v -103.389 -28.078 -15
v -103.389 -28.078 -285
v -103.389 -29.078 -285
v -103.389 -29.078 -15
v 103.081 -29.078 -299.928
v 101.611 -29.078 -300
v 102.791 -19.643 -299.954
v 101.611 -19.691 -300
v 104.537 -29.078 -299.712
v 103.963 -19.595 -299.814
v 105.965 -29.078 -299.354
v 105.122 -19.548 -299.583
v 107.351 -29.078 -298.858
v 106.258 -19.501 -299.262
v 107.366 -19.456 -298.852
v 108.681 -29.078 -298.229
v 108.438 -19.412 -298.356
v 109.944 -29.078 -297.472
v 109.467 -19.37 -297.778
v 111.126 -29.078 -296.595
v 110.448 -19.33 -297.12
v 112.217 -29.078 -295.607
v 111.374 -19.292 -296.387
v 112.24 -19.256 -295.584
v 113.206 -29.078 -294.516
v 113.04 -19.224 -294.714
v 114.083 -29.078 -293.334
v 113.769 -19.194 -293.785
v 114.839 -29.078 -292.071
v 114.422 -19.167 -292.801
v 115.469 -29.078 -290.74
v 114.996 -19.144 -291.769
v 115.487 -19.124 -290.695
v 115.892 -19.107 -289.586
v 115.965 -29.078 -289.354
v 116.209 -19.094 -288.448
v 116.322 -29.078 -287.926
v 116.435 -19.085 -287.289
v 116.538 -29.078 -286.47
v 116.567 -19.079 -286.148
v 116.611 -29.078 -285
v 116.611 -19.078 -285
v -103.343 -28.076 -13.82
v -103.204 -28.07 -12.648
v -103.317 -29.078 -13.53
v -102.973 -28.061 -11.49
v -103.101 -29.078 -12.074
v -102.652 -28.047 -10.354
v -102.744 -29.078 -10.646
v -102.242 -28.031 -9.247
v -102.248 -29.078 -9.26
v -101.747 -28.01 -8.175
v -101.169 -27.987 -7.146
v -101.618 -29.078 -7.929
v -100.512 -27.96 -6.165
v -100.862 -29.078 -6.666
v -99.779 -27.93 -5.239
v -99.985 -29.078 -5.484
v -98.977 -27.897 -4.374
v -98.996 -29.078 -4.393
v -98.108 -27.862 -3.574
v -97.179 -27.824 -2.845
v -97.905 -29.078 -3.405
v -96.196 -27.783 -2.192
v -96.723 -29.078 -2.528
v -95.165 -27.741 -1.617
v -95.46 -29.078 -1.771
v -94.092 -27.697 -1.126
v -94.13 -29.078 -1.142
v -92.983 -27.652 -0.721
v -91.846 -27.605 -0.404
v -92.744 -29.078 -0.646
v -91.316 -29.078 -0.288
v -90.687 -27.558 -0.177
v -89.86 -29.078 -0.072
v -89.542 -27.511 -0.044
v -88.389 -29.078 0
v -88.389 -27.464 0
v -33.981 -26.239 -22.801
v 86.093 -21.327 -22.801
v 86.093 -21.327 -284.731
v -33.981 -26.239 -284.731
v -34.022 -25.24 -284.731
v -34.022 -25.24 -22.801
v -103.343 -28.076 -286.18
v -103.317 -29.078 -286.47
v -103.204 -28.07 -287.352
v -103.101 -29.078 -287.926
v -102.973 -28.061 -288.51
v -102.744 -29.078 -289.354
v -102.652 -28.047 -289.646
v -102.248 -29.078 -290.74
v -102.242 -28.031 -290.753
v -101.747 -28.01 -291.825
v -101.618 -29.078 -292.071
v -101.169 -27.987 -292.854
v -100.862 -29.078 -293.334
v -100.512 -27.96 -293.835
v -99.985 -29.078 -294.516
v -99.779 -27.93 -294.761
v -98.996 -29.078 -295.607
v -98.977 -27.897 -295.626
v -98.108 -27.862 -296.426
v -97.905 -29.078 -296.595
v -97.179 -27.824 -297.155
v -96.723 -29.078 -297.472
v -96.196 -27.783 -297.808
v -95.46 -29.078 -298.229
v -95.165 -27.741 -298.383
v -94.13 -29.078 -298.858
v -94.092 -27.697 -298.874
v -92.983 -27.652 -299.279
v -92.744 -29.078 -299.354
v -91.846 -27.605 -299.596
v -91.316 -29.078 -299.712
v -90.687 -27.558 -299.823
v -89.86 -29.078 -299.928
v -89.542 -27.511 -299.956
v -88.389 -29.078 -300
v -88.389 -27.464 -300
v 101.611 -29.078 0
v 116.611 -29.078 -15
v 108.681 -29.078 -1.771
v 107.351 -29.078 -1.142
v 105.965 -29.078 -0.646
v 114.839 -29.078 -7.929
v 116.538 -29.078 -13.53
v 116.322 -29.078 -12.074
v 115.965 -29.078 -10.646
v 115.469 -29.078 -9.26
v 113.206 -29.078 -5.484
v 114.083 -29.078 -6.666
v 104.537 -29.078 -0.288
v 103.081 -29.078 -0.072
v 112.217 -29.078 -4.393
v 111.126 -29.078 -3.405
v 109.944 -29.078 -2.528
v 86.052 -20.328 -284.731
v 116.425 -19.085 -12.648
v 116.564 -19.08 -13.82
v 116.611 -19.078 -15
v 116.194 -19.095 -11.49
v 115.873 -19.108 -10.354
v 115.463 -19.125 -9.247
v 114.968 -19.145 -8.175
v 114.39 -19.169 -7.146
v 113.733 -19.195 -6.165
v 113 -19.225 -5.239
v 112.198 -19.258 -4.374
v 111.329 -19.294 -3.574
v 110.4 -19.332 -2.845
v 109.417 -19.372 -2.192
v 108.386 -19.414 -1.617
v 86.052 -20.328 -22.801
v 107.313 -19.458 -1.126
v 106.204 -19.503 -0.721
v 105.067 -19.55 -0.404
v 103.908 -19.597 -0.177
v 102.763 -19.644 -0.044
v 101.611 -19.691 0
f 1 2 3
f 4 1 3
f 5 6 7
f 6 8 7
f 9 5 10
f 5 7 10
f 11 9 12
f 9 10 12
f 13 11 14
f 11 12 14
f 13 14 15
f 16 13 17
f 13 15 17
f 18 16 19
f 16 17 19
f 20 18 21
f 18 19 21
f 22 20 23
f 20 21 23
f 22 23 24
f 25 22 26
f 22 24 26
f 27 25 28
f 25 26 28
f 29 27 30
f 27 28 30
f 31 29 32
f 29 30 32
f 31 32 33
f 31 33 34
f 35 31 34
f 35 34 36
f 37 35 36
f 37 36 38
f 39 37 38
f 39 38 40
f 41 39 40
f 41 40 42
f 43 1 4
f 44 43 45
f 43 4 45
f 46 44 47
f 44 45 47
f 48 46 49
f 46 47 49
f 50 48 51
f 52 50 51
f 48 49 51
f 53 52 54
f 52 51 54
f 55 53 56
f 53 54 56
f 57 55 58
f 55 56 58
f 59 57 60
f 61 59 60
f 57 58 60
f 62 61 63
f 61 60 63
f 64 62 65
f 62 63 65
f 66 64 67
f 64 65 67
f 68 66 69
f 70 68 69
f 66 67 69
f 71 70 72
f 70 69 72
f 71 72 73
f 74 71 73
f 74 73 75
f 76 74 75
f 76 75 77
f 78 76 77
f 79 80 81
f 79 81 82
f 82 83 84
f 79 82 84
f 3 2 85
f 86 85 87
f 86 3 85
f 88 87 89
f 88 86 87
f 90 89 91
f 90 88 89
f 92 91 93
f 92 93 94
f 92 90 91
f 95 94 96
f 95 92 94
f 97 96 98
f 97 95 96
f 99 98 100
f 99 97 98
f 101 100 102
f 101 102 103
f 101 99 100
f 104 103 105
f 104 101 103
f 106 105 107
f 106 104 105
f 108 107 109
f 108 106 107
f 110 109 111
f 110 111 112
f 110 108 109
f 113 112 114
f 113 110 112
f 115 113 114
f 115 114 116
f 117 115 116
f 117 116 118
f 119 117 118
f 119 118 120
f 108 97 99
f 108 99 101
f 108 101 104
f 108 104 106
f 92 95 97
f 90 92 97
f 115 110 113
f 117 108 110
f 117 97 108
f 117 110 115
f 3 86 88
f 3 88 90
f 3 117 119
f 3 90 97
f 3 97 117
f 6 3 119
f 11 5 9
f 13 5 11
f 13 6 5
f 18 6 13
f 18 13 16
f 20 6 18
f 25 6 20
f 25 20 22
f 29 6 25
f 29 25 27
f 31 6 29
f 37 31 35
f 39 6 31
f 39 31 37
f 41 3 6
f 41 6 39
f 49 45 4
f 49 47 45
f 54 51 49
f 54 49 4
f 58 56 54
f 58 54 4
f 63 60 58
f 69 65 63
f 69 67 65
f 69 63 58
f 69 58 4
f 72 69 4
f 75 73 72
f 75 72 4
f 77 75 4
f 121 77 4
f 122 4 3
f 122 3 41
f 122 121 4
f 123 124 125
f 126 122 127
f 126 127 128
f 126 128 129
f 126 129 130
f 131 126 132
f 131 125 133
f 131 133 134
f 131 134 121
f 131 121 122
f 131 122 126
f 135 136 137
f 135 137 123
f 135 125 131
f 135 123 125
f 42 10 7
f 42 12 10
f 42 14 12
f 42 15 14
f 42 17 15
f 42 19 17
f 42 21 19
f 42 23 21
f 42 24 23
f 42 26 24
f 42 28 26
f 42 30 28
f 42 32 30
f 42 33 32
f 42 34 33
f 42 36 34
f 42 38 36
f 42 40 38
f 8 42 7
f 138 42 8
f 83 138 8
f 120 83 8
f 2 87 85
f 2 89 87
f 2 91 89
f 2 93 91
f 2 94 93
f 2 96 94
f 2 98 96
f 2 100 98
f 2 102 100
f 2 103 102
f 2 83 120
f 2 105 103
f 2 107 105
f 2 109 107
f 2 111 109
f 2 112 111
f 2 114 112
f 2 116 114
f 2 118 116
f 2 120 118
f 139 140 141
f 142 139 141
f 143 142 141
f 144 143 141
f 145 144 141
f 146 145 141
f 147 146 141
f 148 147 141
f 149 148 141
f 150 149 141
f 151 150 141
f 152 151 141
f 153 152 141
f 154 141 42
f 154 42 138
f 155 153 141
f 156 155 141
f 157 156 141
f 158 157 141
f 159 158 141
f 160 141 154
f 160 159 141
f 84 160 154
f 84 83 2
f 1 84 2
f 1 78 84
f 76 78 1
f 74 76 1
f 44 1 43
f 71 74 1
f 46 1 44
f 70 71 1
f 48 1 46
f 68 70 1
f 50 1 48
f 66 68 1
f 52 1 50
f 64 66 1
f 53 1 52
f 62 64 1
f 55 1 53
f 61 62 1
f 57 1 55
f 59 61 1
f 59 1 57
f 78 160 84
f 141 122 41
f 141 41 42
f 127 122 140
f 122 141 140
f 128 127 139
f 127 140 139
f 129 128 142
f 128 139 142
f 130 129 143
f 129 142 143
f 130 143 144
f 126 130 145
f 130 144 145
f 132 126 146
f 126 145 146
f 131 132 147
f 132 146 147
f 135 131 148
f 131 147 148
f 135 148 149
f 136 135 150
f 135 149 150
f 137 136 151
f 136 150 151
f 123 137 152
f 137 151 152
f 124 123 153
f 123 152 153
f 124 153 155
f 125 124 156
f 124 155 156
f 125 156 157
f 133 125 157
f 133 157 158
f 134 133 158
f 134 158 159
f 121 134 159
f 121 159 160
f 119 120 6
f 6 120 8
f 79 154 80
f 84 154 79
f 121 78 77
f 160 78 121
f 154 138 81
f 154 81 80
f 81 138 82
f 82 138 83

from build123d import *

# Parameters (mm, degrees)
F3_DEPTH = 300
F4_R     = 15
F5_R     = 15
F6_R     = 15
F7_R     = 15
F8_W     = 120.1740764081
F8_H     = 261.9301192462
F9_DEPTH = 1


with BuildPart() as f3:
    # F1 (on face) → F3 (new body)
    with BuildSketch(Plane.XY):
        Polygon((116.6105127335, -19.077671887), (-103.3894872665, -28.077671887), (-103.3894872665, -29.077671887), (116.6105127335, -29.077671887), align=None)
    extrude(amount=-F3_DEPTH)

    # F4
    f4_edges = [f3.edges().sort_by_distance(p)[0] for p in [
        (-103.389487, -28.577672, 0),
    ]]
    fillet(f4_edges, radius=F4_R)

    # F5
    f5_edges = [f3.edges().sort_by_distance(p)[0] for p in [
        (-103.389487, -28.577672, -300),
    ]]
    fillet(f5_edges, radius=F5_R)

    # F6
    f6_edges = [f3.edges().sort_by_distance(p)[0] for p in [
        (116.610513, -24.077672, -300),
    ]]
    fillet(f6_edges, radius=F6_R)

    # F7
    f7_edges = [f3.edges().sort_by_distance(p)[0] for p in [
        (116.610513, -24.077672, 0),
    ]]
    fillet(f7_edges, radius=F7_R)

    # F8 (on face) → F9 (cut)
    with BuildSketch(Plane(origin=(0.9739741727, -23.8082575553, 0), x_dir=(-0.999164272, -0.040874902, 0), z_dir=(-0.040874902, 0.999164272, 0))):
        with Locations((-25.0621605664, -153.7662539631)):
            Rectangle(F8_W, F8_H)
    extrude(amount=-F9_DEPTH, mode=Mode.SUBTRACT)


solid = f3.part
